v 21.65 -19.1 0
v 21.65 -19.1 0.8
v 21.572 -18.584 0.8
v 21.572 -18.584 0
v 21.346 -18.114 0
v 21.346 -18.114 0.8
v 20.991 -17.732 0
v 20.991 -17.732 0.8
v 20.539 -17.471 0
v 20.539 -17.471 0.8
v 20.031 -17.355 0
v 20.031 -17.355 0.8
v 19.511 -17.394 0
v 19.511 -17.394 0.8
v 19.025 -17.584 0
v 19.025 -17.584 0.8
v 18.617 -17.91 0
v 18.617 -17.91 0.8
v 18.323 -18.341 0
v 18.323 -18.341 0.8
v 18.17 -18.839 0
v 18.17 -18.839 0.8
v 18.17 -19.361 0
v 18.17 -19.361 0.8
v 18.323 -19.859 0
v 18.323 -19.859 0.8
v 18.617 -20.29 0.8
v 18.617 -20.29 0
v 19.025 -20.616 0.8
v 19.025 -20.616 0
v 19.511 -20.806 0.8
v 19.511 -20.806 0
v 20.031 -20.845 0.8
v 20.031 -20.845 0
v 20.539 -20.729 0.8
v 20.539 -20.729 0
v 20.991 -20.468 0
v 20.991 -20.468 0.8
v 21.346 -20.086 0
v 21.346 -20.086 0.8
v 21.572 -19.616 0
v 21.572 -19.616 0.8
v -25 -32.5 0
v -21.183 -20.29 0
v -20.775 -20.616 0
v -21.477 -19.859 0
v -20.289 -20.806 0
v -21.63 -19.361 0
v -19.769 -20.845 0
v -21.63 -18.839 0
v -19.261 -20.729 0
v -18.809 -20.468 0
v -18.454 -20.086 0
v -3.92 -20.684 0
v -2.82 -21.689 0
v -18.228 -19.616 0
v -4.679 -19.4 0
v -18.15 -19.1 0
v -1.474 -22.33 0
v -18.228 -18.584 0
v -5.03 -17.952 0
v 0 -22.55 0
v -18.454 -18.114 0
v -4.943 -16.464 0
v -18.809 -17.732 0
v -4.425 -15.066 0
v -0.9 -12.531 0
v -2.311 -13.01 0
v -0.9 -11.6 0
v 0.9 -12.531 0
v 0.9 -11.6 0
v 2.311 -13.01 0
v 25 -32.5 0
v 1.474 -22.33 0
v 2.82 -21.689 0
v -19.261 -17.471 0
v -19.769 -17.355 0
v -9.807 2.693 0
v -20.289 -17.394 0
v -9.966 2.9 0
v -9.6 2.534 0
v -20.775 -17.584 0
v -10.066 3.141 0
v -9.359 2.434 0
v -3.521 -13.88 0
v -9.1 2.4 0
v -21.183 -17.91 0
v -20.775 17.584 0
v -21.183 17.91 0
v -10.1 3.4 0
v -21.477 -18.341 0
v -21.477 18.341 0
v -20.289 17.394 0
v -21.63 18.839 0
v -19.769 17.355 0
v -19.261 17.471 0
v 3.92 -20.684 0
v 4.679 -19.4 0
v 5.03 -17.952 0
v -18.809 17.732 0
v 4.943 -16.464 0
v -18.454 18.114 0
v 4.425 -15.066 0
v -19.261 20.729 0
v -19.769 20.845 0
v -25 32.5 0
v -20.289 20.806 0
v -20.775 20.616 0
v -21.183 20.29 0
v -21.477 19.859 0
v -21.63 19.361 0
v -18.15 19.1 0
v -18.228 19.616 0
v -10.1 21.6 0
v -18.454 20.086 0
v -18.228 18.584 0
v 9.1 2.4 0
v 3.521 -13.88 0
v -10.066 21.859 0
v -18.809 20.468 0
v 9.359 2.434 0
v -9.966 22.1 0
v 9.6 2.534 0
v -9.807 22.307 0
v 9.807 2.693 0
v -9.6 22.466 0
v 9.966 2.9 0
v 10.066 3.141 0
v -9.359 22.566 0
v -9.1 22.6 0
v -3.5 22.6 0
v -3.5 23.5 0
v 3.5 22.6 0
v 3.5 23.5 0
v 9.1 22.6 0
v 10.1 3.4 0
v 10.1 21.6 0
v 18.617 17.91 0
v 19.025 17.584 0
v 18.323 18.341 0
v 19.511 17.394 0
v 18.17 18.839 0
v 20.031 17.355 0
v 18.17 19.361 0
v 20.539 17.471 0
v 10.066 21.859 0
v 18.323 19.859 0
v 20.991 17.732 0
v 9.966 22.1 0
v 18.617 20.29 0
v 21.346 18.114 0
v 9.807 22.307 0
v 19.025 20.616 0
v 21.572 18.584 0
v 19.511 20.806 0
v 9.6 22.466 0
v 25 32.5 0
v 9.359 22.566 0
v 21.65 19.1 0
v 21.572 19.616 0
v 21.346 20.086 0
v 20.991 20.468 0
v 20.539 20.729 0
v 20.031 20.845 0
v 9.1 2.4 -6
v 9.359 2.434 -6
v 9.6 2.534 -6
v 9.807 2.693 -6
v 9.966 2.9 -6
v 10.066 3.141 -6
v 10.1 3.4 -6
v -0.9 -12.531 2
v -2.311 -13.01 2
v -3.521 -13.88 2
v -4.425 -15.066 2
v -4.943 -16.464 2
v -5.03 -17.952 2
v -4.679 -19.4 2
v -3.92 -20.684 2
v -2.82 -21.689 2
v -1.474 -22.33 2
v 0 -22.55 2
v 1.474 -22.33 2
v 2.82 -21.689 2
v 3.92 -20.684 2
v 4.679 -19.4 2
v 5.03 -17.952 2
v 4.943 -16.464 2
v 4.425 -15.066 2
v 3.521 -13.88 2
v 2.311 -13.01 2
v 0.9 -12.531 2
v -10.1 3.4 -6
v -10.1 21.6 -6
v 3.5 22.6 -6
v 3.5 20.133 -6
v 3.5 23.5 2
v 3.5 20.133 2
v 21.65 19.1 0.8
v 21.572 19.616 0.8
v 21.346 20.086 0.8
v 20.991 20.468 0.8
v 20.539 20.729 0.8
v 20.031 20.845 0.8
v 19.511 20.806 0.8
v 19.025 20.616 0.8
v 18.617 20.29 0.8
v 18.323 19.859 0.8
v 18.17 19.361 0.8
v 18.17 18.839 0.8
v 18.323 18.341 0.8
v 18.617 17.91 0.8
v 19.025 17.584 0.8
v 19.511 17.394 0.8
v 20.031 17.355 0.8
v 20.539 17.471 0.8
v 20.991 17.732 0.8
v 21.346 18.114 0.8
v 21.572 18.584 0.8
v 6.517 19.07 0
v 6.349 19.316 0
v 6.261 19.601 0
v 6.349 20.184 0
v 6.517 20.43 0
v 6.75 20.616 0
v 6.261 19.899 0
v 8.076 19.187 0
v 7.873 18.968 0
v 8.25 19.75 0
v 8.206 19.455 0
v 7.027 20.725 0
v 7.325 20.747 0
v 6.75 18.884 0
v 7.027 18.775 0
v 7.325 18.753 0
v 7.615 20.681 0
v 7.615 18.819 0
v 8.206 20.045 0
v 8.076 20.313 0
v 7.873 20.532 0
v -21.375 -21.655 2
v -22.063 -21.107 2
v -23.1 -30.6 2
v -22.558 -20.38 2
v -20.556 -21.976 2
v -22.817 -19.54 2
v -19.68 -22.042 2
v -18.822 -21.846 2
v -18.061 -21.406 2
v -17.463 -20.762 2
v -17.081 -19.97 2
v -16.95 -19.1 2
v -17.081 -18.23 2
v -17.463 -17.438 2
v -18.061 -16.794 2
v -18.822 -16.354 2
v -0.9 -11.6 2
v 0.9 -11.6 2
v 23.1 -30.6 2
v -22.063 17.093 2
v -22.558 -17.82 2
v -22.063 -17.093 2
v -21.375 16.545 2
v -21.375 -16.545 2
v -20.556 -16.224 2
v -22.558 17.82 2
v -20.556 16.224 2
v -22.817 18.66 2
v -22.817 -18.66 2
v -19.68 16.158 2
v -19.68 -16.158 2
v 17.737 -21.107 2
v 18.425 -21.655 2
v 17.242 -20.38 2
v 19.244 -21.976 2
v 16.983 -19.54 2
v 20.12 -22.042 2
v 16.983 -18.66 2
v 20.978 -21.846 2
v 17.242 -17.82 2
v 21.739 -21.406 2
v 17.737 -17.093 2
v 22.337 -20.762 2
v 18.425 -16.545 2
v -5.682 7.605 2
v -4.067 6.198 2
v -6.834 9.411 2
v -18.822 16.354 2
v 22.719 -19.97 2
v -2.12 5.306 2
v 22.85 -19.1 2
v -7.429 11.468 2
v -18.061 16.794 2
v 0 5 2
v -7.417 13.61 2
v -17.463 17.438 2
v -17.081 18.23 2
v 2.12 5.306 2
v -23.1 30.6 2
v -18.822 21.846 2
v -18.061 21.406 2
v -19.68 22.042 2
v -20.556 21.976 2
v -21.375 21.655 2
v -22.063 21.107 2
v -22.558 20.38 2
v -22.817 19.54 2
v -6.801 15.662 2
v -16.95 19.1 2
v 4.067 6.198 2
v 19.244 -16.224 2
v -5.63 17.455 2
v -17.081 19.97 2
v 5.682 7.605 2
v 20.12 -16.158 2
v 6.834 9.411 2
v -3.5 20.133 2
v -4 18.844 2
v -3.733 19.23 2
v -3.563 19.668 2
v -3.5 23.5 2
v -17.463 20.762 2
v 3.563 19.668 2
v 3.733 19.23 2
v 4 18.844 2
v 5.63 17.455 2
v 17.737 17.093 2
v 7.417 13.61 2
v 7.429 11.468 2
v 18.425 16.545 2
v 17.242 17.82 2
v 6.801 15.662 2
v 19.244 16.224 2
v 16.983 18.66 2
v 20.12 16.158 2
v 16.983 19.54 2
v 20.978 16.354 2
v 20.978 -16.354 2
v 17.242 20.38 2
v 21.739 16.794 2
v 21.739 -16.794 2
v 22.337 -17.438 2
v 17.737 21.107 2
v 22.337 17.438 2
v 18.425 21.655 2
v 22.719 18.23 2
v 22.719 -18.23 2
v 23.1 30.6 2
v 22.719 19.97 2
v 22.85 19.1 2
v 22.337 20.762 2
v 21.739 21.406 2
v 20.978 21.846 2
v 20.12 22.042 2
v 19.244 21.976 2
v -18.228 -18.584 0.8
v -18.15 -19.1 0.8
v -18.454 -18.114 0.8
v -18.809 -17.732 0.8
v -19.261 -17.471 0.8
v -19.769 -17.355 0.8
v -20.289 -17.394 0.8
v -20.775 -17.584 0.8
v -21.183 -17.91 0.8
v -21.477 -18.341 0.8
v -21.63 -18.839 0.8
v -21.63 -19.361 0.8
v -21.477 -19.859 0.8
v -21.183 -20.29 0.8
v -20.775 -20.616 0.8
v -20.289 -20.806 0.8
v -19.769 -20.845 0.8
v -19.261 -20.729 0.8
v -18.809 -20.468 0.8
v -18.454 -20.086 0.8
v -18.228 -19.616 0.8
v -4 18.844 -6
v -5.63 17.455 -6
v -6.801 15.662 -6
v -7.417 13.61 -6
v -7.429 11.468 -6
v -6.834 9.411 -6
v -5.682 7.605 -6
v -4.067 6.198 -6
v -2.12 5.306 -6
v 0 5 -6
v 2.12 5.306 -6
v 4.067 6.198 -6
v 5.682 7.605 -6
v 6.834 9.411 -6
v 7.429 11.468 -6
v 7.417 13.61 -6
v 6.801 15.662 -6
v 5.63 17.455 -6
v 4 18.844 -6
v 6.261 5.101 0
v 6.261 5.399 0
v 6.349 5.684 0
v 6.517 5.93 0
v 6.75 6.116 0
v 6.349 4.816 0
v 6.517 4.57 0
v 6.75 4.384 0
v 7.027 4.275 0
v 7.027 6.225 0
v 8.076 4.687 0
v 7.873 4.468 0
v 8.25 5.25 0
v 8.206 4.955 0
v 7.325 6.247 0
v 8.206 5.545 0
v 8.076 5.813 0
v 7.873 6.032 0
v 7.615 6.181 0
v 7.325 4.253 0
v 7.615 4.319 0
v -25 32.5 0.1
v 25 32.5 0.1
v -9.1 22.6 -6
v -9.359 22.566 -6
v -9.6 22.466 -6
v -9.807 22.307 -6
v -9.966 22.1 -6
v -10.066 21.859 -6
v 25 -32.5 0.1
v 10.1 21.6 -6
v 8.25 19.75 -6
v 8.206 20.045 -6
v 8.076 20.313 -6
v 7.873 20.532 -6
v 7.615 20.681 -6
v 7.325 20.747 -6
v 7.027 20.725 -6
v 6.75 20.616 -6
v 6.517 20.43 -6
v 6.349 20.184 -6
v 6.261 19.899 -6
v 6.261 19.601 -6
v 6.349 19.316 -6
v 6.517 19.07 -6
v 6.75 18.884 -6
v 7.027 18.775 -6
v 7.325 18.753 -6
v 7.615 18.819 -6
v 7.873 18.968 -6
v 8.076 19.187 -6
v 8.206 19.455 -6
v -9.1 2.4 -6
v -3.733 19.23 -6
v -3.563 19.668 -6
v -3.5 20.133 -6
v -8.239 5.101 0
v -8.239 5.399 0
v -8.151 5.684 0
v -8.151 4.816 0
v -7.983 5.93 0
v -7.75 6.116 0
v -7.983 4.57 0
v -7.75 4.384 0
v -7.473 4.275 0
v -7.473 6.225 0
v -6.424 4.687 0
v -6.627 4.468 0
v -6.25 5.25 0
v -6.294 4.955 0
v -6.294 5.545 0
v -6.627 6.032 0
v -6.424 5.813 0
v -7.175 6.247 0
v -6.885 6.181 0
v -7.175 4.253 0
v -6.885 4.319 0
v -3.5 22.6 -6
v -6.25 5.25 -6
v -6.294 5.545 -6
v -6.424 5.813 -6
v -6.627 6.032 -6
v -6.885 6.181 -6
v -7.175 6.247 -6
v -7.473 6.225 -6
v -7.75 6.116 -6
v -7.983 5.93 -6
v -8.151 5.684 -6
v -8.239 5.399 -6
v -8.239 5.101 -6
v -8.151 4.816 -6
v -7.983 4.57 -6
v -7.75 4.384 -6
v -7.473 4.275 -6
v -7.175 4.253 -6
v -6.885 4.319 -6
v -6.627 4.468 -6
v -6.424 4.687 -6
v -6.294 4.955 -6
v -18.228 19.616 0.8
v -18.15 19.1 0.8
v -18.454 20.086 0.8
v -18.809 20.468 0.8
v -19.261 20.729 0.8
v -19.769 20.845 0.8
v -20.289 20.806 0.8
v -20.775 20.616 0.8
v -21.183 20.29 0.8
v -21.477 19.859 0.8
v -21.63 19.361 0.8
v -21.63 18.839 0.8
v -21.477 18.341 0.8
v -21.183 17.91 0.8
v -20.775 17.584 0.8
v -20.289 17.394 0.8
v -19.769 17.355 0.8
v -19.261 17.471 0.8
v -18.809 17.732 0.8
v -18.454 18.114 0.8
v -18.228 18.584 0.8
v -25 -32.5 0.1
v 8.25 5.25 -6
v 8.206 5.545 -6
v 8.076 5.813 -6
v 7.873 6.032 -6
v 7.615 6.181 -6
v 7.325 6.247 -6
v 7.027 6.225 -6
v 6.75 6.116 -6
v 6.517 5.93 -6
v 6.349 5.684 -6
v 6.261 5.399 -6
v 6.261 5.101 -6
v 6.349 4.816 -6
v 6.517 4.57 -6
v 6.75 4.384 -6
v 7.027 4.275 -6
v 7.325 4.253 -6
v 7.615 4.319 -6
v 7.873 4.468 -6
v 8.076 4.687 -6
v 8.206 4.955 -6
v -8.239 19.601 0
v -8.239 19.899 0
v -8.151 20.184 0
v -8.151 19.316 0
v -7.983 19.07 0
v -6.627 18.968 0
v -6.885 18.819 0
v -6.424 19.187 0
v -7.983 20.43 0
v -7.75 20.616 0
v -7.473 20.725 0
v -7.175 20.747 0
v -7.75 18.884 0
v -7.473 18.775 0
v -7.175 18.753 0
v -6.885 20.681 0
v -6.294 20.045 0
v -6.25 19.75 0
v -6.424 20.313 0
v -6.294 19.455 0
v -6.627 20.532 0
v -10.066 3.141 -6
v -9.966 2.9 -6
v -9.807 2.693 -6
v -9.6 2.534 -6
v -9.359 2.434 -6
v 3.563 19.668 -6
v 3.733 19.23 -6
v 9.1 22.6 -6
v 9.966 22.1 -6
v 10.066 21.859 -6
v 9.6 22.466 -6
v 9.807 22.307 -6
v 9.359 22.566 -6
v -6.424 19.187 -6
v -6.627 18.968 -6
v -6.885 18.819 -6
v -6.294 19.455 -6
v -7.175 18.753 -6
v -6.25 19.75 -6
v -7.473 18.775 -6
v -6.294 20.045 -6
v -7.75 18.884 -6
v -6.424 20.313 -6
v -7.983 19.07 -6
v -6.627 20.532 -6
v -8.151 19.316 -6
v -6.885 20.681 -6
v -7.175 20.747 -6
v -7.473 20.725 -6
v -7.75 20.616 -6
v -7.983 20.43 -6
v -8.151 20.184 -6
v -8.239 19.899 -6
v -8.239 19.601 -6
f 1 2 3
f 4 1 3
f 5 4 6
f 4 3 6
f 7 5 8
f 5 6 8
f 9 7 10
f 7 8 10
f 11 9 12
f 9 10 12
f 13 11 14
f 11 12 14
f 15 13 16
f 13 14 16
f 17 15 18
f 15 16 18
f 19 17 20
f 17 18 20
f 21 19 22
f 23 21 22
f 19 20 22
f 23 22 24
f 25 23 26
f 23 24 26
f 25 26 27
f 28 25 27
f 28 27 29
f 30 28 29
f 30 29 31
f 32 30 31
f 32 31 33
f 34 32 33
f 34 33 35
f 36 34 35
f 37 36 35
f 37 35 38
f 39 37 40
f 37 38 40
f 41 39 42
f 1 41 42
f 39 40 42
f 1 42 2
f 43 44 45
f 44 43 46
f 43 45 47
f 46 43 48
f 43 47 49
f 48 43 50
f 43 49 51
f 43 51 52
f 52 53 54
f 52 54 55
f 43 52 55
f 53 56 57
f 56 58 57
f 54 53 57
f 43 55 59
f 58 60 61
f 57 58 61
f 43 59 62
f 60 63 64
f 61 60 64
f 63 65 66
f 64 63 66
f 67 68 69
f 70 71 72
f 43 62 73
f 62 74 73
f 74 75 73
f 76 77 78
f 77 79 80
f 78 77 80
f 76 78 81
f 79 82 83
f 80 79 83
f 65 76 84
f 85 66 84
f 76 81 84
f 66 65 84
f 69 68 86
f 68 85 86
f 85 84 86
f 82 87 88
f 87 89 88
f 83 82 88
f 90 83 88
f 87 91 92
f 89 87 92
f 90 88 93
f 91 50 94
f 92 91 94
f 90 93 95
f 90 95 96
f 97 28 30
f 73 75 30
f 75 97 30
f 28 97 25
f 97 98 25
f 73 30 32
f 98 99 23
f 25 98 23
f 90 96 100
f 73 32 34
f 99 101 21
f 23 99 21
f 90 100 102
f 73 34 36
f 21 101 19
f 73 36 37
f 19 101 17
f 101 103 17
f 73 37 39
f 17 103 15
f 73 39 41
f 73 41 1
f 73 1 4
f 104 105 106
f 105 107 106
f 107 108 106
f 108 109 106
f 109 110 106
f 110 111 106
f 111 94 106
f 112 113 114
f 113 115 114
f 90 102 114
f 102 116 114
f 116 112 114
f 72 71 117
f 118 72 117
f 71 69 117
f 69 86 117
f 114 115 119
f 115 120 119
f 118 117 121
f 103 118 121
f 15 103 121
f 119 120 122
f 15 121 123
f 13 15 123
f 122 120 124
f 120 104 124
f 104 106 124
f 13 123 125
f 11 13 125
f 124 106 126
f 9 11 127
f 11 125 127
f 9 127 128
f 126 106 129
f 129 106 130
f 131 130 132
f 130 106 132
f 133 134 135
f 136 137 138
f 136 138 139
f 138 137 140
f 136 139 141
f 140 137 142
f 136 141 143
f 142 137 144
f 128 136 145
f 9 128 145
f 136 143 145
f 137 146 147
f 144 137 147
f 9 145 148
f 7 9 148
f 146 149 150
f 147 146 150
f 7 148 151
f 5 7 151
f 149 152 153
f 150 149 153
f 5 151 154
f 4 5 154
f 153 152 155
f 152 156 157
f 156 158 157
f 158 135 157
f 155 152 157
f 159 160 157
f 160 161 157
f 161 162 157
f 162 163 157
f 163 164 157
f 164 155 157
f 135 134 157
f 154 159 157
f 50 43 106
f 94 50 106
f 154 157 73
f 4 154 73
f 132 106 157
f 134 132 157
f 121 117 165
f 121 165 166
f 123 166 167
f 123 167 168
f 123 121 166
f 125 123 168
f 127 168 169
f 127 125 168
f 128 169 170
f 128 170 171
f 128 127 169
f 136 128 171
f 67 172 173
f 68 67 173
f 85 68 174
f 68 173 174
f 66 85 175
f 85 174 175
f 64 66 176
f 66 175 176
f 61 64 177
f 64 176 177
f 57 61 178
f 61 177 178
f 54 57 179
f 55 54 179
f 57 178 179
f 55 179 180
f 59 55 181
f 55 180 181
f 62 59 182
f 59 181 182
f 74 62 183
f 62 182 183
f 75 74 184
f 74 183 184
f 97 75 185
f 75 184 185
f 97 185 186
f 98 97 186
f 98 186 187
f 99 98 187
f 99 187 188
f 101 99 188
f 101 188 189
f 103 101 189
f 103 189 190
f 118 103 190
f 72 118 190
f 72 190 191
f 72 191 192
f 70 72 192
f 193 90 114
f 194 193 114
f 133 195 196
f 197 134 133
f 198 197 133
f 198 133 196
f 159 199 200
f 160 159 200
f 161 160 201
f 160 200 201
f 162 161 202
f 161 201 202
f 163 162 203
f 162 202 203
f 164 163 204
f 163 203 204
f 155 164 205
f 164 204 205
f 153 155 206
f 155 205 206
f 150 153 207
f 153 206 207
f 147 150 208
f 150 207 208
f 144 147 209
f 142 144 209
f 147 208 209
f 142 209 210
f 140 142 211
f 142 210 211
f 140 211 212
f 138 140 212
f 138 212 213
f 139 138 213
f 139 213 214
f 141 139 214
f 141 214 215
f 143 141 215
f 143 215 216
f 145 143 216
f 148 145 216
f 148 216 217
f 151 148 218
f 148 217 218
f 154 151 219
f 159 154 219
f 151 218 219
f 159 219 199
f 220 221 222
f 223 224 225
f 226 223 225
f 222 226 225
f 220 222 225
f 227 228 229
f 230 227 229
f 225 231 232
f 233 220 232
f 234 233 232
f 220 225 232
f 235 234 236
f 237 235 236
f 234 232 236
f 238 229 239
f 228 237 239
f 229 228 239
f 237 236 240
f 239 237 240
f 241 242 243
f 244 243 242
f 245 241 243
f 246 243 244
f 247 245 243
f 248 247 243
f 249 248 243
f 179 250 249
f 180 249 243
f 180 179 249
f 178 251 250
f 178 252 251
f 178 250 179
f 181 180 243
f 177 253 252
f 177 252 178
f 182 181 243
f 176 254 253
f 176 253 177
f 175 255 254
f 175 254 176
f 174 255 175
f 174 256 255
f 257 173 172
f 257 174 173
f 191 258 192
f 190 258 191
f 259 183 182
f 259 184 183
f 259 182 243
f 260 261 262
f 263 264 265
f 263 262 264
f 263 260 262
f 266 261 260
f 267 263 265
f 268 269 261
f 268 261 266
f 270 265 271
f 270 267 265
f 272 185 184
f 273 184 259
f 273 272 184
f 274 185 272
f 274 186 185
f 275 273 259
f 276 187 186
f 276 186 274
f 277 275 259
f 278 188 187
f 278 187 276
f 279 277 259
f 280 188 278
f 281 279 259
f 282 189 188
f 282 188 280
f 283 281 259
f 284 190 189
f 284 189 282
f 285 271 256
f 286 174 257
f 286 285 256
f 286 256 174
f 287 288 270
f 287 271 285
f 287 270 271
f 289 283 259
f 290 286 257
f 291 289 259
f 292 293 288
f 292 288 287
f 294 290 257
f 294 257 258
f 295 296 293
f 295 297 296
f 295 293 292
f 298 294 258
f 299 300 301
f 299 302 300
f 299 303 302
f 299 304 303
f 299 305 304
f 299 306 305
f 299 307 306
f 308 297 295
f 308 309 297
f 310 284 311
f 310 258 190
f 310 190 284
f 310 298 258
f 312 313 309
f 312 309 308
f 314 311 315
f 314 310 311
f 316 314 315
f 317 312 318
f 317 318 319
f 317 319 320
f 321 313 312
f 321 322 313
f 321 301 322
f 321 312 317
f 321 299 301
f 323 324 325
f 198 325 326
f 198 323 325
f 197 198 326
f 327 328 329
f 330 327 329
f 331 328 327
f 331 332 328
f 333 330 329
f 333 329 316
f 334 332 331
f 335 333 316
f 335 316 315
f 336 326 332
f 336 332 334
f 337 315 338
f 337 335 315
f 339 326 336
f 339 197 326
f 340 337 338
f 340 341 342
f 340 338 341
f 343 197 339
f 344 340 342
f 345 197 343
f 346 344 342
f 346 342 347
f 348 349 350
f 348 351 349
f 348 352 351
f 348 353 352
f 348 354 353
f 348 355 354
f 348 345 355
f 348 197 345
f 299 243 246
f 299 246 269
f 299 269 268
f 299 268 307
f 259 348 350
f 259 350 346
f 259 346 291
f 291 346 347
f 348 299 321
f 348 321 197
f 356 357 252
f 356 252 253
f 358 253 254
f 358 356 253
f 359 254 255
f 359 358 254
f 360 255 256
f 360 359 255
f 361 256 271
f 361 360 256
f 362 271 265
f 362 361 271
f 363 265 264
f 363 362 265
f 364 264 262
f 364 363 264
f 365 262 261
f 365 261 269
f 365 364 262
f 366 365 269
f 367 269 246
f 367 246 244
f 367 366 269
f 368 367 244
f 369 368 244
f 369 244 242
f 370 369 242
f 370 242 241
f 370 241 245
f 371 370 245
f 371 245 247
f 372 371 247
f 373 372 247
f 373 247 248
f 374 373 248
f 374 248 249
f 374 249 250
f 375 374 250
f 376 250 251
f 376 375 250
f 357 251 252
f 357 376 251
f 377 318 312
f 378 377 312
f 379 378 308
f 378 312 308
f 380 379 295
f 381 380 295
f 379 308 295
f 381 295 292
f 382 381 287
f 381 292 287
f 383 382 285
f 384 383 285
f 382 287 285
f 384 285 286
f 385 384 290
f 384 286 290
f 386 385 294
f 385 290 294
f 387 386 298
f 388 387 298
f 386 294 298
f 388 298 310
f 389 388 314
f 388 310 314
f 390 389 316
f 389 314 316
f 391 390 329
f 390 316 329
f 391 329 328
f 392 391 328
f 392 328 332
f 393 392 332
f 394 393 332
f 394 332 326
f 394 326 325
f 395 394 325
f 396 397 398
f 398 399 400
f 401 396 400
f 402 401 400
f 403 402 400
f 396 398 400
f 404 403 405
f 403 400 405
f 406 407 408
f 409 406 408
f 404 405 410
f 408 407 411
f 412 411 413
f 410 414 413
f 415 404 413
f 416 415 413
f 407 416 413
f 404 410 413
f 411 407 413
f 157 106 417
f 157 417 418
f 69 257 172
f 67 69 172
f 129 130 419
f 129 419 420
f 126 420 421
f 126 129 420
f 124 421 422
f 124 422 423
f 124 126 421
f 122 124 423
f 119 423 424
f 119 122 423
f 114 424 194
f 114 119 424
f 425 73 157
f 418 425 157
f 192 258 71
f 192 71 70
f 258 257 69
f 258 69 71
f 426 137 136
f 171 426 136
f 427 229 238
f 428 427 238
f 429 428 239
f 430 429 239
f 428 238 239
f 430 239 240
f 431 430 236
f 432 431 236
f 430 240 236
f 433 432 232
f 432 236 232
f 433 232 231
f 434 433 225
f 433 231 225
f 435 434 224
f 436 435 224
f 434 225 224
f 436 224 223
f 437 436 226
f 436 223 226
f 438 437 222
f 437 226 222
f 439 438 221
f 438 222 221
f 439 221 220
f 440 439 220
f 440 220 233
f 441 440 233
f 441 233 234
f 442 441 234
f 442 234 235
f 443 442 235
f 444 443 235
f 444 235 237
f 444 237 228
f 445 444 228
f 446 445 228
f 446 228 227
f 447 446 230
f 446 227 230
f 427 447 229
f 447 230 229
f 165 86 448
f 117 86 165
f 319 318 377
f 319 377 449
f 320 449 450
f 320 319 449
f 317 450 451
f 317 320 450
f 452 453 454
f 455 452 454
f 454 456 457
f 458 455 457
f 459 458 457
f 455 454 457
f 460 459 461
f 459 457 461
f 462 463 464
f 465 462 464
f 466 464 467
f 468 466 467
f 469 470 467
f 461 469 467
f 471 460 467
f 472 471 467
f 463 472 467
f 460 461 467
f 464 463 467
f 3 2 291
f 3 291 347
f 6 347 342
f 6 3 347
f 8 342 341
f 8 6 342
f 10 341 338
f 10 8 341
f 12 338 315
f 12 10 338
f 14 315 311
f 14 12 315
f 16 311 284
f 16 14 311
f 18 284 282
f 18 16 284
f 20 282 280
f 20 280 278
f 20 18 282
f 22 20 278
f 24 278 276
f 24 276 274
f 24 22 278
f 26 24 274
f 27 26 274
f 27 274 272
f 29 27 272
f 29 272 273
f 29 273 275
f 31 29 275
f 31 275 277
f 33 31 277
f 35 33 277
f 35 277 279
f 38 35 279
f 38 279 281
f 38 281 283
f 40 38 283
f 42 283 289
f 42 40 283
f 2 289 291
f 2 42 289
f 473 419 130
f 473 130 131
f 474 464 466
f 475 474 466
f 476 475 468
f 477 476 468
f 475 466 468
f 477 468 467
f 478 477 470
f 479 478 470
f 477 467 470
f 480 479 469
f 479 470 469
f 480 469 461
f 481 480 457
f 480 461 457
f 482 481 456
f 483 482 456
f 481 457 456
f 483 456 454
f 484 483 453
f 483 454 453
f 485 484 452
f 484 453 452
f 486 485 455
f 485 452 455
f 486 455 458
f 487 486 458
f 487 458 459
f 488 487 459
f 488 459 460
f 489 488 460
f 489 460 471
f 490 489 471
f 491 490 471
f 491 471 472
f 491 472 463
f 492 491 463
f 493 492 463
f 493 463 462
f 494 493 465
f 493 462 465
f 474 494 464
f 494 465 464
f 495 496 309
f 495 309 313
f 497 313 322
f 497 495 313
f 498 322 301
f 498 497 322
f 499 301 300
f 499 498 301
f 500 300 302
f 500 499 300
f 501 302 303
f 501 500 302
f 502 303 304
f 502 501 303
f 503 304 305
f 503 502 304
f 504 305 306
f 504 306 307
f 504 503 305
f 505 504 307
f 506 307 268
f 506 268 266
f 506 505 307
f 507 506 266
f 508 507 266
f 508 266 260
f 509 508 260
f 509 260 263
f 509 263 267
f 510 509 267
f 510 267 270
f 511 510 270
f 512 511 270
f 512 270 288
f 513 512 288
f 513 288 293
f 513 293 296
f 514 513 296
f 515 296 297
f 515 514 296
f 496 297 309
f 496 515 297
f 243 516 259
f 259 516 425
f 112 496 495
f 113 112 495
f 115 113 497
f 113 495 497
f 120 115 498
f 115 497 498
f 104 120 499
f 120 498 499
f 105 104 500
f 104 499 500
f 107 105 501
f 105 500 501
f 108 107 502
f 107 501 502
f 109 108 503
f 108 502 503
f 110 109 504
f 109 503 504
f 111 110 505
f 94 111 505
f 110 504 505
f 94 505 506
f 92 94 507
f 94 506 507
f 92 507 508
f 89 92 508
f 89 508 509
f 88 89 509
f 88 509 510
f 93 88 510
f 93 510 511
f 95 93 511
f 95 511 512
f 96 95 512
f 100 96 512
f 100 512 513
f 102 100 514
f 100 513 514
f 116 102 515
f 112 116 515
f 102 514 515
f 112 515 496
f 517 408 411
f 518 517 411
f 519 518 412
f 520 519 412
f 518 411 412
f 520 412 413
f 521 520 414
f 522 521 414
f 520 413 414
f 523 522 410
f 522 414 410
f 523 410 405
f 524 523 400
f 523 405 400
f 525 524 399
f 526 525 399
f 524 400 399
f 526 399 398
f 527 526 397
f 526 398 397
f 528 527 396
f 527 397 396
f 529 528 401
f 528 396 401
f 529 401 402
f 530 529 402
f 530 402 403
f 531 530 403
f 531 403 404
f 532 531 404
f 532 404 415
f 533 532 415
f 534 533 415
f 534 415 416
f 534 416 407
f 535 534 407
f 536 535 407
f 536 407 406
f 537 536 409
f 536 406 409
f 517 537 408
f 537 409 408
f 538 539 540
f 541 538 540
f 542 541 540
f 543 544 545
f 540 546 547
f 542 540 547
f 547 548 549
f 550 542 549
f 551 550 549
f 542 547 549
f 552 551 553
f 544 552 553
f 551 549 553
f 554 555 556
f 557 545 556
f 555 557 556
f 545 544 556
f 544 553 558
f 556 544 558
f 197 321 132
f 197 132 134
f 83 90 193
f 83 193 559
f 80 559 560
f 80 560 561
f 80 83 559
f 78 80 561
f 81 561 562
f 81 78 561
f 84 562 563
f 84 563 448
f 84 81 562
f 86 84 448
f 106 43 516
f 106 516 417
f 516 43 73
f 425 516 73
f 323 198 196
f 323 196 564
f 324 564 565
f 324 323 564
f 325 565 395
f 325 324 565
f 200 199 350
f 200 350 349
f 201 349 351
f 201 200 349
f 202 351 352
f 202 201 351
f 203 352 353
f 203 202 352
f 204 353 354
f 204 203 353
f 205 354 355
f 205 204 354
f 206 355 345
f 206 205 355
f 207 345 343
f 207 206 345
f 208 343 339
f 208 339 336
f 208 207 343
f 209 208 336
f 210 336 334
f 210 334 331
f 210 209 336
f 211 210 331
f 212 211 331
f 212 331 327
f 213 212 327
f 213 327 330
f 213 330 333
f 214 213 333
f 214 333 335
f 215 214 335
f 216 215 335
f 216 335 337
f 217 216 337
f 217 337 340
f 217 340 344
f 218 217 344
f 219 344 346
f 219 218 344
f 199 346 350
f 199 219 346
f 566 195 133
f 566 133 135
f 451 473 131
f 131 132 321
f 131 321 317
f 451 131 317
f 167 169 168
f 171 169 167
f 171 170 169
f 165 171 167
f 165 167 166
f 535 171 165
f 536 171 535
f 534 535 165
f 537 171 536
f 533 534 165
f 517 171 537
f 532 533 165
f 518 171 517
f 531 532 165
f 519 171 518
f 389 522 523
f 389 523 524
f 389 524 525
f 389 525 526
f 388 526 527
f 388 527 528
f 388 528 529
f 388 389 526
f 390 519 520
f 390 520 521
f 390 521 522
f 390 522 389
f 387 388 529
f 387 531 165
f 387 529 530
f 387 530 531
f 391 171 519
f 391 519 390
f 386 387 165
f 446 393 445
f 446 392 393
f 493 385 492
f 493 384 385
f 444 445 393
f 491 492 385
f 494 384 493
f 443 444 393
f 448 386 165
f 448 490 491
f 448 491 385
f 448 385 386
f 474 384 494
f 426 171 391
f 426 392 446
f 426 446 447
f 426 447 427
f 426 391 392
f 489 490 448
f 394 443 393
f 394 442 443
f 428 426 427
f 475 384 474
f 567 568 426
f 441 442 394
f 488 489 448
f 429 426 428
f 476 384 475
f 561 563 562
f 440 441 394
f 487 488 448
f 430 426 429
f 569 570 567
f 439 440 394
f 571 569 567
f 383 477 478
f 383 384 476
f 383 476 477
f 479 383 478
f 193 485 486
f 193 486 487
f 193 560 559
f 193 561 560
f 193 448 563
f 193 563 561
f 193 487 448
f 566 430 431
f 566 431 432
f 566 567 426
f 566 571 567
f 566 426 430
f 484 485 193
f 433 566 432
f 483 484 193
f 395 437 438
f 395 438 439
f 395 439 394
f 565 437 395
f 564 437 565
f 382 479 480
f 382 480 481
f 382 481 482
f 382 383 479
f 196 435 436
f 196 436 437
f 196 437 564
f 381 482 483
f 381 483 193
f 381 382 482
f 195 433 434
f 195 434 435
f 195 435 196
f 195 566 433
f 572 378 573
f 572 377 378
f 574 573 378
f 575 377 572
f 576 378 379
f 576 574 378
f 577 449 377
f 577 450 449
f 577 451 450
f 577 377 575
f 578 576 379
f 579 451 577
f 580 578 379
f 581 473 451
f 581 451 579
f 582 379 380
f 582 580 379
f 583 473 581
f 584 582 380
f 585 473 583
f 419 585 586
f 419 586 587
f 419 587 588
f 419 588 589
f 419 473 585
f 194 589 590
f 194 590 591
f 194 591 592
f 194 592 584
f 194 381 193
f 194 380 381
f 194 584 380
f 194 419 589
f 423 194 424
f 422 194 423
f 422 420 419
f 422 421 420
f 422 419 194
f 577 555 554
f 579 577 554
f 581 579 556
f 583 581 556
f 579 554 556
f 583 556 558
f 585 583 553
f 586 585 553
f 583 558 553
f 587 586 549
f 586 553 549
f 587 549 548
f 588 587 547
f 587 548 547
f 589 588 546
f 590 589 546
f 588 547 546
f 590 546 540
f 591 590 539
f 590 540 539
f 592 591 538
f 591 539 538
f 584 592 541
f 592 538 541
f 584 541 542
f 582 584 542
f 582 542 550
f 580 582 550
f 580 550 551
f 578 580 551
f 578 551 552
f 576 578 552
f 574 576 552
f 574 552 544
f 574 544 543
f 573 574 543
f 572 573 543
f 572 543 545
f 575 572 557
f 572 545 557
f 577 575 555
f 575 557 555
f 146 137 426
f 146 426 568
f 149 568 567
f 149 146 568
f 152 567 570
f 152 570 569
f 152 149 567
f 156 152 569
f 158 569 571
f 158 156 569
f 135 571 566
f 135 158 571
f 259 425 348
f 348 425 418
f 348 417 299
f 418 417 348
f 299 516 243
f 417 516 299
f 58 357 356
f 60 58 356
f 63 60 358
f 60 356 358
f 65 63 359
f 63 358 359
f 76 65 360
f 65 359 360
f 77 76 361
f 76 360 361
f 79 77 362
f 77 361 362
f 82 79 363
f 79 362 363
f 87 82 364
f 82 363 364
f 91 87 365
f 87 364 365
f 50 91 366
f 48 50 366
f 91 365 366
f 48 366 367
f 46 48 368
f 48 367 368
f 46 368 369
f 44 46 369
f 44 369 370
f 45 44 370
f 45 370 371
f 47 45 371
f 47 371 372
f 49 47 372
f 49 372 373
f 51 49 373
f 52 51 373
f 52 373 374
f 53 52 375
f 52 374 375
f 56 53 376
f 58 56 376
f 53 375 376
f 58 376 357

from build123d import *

# Parameters (mm, degrees)
SKETCH_W        = 50
SKETCH_H        = 65
PAD_DEPTH       = 2
SKETCH003_R     = 1
PAD001_DEPTH    = 6
POCKET001_DEPTH = 8.001
SKETCH001_R     = 1.75
POCKET_DEPTH    = 2
CHAMFER_SIZE    = 1.2
CHAMFER001_SIZE = 1.9


with BuildPart() as part:
    # Sketch → Pad (new body)
    with BuildSketch(Plane.XY):
        Rectangle(SKETCH_W, SKETCH_H)
    extrude(amount=PAD_DEPTH)

    # Sketch003 (on DatumPlane) → Pad001 (join)
    with BuildSketch(Plane.XY):
        with BuildLine():
            Line((-10.1, 3.4), (-10.1, 21.6))
            ThreePointArc((-9.1, 22.6), (-9.807107, 22.307107), (-10.1, 21.6))
            Line((-9.1, 22.6), (9.1, 22.6))
            ThreePointArc((10.1, 21.6), (9.807107, 22.307107), (9.1, 22.6))
            Line((10.1, 21.6), (10.1, 3.4))
            ThreePointArc((9.1, 2.4), (9.807107, 2.692893), (10.1, 3.4))
            Line((-9.1, 2.4), (9.1, 2.4))
            ThreePointArc((-10.1, 3.4), (-9.807107, 2.692893), (-9.1, 2.4))
        make_face()
        with Locations((-7.25, 5.25)):
            Circle(SKETCH003_R, mode=Mode.SUBTRACT)
        with Locations((7.25, 5.25)):
            Circle(SKETCH003_R, mode=Mode.SUBTRACT)
        with Locations((7.25, 19.75)):
            Circle(SKETCH003_R, mode=Mode.SUBTRACT)
        with Locations((-7.25, 19.75)):
            Circle(SKETCH003_R, mode=Mode.SUBTRACT)
    extrude(amount=-PAD001_DEPTH)

    # Sketch002 (on DatumPlane) → Pocket001 (cut, through all)
    with BuildSketch(Plane.XY.offset(2)):
        with BuildLine():
            ThreePointArc((-4, 18.844289), (0, 5), (4, 18.844289))
            ThreePointArc((3.5, 20.13325), (3.635081, 19.444191), (4, 18.844289))
            Line((3.5, 23.5), (3.5, 20.13325))
            Line((-3.5, 23.5), (3.5, 23.5))
            Line((-3.5, 23.5), (-3.5, 20.13325))
            ThreePointArc((-4, 18.844289), (-3.635081, 19.444191), (-3.5, 20.13325))
        make_face()
        with BuildLine():
            ThreePointArc((-0.9, -12.530845), (0, -22.55), (0.9, -12.530845))
            Line((0.9, -11.6), (0.9, -12.530845))
            Line((-0.9, -11.6), (0.9, -11.6))
            Line((-0.9, -11.6), (-0.9, -12.530845))
        make_face()
    extrude(amount=-POCKET001_DEPTH, mode=Mode.SUBTRACT)

    # Sketch001 (on DatumPlane) → Pocket (cut)
    with BuildSketch(Plane.XY.offset(2)):
        with Locations((-19.9, 19.1)):
            Circle(SKETCH001_R)
        with Locations((19.9, 19.1)):
            Circle(SKETCH001_R)
        with Locations((19.9, -19.1)):
            Circle(SKETCH001_R)
        with Locations((-19.9, -19.1)):
            Circle(SKETCH001_R)
    extrude(amount=-POCKET_DEPTH, mode=Mode.SUBTRACT)

    # Chamfer
    chamfer_edges = [part.edges().sort_by_distance(p)[0] for p in [
        (-21.65, 19.1, 2),
        (18.15, 19.1, 2),
        (18.15, -19.1, 2),
        (-21.65, -19.1, 2),
    ]]
    chamfer(chamfer_edges, length=CHAMFER_SIZE)

    # Chamfer001
    chamfer001_edges = [part.edges().sort_by_distance(p)[0] for p in [
        (-25, 0, 2),
        (0, 32.5, 2),
        (25, 0, 2),
        (0, -32.5, 2),
    ]]
    chamfer(chamfer001_edges, length=CHAMFER001_SIZE)


solid = part.part
